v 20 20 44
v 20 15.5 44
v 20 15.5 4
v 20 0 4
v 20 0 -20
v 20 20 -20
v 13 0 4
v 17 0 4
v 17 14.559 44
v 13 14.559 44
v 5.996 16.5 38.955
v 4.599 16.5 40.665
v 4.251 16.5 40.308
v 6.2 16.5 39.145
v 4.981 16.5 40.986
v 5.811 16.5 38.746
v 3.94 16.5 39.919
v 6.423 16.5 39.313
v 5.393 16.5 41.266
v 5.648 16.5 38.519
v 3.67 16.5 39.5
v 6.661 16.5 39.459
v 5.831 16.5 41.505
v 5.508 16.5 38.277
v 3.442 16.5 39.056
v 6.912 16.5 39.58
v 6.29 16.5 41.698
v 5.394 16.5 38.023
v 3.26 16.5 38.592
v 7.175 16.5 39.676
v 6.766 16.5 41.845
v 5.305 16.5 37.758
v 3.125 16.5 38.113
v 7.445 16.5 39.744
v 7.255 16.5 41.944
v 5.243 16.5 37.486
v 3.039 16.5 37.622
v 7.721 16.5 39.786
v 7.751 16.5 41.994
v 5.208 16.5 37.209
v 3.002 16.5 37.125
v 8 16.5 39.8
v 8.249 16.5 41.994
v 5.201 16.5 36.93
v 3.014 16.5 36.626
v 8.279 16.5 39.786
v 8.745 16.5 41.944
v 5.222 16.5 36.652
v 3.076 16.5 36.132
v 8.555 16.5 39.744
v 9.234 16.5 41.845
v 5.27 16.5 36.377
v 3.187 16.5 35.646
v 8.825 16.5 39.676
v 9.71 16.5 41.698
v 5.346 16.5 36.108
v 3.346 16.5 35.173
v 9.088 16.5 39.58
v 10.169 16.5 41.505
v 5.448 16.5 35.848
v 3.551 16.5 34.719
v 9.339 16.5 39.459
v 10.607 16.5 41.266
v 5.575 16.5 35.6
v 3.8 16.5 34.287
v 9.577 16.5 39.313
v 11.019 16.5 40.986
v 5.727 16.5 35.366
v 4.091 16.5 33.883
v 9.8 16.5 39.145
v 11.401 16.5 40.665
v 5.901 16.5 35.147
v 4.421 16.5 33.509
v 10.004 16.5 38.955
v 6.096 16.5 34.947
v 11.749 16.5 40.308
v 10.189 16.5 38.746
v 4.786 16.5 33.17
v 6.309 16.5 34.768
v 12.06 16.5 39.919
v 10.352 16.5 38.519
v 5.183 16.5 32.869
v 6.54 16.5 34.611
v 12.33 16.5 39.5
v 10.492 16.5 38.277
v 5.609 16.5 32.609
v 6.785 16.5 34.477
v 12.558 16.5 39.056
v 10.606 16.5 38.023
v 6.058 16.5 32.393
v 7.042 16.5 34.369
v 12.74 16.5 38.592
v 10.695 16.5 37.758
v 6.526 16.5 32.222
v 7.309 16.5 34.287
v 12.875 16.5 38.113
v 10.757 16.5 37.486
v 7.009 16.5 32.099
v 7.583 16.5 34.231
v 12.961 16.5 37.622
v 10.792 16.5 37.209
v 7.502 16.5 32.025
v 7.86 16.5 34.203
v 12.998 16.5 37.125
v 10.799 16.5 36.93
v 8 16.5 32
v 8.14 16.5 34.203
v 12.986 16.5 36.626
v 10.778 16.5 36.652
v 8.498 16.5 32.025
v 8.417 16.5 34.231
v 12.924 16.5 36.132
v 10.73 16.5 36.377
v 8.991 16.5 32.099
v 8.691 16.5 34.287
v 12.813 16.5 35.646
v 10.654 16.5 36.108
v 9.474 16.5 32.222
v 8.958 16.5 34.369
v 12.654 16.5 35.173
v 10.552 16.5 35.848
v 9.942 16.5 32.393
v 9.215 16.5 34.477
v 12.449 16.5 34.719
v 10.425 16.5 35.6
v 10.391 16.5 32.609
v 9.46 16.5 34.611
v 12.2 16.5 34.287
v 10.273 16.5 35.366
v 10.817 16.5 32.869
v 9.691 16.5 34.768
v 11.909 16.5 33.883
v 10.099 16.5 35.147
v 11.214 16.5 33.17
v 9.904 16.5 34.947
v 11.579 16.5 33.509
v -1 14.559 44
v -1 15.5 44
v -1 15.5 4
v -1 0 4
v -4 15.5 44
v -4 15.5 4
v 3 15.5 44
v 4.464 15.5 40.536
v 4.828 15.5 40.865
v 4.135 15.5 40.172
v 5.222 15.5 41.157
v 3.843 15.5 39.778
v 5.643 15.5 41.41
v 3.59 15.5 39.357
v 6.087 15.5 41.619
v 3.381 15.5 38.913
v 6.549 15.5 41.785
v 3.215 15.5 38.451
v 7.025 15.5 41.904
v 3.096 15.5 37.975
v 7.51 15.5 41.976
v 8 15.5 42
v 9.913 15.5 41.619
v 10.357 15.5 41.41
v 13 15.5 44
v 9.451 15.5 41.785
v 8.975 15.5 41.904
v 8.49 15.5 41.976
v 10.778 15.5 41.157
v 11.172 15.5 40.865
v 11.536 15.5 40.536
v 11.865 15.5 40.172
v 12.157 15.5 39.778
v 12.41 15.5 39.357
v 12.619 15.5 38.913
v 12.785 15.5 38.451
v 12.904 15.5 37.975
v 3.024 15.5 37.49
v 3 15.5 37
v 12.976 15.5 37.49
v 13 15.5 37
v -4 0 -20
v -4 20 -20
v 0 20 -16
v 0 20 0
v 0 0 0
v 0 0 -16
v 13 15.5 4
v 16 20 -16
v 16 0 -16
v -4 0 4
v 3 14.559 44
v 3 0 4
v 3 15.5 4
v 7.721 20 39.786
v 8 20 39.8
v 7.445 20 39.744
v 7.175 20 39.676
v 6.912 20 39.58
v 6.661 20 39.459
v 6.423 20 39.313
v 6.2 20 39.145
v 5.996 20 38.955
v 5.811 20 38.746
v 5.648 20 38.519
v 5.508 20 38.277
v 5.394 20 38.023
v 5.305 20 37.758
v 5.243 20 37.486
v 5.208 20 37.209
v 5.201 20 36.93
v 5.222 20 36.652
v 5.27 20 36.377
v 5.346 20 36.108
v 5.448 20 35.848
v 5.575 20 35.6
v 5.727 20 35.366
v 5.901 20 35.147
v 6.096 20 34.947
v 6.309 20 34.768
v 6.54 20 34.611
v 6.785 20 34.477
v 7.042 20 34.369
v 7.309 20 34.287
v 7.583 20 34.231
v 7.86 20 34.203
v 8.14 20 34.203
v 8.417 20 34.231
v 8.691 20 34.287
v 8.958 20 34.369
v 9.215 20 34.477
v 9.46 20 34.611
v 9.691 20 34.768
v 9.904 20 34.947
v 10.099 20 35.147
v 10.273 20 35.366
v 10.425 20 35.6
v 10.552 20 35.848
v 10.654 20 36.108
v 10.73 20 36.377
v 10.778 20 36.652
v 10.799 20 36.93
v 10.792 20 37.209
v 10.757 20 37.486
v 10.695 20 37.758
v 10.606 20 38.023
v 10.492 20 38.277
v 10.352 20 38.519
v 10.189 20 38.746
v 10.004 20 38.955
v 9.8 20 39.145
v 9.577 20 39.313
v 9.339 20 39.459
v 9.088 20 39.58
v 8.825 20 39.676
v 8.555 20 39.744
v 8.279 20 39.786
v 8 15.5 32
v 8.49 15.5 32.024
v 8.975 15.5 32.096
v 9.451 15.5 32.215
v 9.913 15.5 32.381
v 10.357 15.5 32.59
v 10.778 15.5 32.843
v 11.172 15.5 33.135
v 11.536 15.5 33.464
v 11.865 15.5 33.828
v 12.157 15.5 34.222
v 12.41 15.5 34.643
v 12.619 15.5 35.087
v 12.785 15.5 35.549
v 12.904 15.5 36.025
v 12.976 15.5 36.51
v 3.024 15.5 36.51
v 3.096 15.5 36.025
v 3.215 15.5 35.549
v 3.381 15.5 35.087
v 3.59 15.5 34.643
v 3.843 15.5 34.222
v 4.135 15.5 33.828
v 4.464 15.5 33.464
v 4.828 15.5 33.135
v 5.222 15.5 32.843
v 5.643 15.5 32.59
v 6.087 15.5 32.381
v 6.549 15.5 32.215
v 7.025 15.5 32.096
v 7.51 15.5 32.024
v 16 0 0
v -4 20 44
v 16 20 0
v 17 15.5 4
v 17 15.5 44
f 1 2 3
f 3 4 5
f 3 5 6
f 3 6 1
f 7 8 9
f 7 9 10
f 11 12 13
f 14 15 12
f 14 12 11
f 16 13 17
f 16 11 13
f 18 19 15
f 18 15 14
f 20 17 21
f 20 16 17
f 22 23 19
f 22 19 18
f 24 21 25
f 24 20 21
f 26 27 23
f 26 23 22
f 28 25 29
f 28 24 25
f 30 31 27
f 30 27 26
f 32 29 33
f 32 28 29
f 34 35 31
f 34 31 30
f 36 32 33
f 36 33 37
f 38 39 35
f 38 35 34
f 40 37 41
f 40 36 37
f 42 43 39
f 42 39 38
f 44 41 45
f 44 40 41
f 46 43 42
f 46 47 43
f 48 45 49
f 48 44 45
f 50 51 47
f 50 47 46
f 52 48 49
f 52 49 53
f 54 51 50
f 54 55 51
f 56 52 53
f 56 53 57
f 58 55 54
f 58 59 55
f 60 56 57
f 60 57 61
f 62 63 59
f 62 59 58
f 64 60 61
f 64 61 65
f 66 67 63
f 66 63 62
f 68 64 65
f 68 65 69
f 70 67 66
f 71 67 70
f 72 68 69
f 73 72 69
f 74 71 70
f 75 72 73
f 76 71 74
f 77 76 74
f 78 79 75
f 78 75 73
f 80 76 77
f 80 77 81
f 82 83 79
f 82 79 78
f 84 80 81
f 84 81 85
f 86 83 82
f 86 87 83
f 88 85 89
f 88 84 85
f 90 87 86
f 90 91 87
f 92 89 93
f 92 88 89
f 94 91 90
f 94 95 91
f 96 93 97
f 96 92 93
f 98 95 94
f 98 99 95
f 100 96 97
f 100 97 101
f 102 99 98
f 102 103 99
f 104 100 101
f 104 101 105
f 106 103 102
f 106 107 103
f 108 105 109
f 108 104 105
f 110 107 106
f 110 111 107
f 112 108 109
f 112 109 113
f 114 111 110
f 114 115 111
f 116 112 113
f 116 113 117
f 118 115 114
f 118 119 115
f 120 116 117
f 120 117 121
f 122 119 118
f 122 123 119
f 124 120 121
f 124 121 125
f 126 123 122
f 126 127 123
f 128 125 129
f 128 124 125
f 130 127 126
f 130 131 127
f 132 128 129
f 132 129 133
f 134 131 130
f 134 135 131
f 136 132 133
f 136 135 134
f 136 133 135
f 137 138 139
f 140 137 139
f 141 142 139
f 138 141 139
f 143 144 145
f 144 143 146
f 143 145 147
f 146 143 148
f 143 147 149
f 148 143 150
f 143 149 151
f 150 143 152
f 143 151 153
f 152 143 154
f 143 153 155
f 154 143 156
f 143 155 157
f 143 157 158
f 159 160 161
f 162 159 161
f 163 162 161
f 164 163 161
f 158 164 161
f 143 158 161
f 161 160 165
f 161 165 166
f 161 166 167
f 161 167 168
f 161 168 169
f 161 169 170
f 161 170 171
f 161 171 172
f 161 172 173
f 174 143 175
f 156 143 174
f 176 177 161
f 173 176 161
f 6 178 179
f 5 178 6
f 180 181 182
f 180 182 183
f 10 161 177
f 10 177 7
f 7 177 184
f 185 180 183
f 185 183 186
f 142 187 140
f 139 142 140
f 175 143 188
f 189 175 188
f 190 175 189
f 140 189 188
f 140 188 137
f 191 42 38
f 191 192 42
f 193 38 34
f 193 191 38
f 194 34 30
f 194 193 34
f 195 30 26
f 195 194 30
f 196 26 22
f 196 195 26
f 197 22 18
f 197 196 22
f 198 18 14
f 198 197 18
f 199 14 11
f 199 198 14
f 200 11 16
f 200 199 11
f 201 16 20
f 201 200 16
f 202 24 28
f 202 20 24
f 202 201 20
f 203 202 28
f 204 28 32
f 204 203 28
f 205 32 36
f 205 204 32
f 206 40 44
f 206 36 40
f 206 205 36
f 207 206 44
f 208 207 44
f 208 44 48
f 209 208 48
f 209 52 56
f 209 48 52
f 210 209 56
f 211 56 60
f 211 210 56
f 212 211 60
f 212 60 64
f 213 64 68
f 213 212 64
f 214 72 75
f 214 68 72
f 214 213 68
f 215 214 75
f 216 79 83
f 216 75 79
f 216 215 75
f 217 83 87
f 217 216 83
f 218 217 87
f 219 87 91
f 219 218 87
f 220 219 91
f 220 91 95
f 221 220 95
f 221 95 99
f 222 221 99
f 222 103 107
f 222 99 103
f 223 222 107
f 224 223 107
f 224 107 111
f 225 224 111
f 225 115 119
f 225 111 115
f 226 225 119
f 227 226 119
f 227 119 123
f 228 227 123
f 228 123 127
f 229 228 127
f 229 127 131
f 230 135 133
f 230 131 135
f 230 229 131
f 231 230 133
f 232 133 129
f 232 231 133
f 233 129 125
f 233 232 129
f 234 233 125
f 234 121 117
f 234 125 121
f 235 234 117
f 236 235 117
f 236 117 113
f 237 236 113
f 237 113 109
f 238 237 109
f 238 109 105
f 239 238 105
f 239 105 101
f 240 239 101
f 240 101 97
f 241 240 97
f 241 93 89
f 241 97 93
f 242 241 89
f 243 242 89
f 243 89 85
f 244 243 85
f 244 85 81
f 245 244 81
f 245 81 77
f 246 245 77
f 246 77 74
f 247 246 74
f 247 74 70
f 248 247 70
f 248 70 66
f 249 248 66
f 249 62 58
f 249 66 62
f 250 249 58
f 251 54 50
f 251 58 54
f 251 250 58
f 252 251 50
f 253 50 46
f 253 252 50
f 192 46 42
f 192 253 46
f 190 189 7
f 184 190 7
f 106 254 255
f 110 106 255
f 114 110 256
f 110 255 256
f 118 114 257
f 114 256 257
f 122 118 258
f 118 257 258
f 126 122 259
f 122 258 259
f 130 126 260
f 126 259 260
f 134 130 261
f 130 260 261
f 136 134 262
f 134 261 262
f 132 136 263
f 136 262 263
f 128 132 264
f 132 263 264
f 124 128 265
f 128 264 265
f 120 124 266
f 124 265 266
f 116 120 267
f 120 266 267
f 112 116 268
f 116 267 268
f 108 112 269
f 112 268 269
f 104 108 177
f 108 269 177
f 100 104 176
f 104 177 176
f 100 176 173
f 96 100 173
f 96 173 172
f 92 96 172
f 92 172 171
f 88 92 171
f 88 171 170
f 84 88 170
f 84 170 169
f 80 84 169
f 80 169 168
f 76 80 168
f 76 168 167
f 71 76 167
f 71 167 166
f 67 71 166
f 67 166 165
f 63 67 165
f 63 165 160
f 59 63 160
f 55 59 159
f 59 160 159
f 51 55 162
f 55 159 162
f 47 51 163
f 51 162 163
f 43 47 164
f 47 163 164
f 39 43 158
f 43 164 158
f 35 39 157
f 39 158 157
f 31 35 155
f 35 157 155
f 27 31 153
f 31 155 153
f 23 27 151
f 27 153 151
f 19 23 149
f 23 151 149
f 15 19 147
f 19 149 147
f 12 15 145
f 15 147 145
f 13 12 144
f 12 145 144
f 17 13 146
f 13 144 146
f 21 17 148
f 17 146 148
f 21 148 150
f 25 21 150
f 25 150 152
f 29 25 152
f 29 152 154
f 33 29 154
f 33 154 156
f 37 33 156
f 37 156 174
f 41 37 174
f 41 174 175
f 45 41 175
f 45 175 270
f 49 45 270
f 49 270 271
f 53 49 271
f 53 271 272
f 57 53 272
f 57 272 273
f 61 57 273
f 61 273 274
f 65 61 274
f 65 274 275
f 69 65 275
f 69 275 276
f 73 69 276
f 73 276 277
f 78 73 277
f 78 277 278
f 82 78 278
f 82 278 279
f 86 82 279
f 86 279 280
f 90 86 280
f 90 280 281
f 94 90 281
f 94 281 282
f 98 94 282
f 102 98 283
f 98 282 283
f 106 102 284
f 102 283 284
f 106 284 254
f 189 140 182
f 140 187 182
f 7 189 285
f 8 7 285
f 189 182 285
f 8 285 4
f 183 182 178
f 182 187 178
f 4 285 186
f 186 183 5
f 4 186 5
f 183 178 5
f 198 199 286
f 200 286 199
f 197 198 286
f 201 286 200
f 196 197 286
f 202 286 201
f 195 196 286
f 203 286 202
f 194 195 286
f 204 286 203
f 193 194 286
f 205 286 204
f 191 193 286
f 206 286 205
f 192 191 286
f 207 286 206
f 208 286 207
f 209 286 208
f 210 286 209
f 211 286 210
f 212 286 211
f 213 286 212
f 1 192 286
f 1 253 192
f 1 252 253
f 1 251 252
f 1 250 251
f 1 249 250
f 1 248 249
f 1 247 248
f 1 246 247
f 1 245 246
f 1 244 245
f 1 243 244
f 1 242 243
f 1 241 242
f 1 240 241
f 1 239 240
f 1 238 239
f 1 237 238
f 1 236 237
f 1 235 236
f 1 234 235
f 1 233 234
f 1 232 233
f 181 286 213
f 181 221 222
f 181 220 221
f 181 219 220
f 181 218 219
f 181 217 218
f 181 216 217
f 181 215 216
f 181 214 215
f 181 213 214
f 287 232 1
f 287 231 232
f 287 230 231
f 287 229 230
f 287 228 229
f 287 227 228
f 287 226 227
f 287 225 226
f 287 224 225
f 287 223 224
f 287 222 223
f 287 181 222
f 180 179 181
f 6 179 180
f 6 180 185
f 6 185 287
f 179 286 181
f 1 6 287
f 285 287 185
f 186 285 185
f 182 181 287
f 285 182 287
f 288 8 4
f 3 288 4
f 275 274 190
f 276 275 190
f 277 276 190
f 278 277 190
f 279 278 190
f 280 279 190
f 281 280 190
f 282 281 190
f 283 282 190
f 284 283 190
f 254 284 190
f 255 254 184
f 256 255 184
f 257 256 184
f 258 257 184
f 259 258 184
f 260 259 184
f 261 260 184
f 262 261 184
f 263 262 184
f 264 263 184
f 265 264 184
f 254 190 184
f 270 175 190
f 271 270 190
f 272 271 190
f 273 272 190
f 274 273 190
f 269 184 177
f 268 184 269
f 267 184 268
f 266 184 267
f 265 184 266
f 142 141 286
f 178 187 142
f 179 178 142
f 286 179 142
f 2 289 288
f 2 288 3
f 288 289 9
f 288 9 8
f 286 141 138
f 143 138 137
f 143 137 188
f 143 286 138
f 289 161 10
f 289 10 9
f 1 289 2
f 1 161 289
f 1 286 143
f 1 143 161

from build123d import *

# Parameters (mm, degrees)
SKETCH_1_W               = 24
SKETCH_1_H               = 24
SKETCH_1_W_2             = 16
SKETCH_1_H_2             = 16
EXTRUDE_1_DEPTH          = 20
SKETCH_2_W               = 24
SKETCH_2_H               = 4.5
EXTRUDE_2_DEPTH          = 40
CUT_EXTRUDE_1_DEPTH      = 40
CUT_EXTRUDE_1_DEPTH_BACK = 40
SKETCH_3_R               = 2.8
SKETCH_6_W               = 4
SKETCH_6_H               = 40
EXTRUDE_3_DEPTH          = 15.5
CHAMFER_1_SIZE           = 40
CHAMFER_1_SIZE2          = 14.558809371
SKETCH_7_R               = 5
CUT_EXTRUDE_2_DEPTH      = 1


with BuildPart() as part:
    # 草图1 → 凸台-拉伸1 (new body)
    with BuildSketch(Plane(origin=(0, 0, 0), x_dir=(1, 0, 0), z_dir=(0, 1, 0))):
        with Locations((8, 8)):
            Rectangle(SKETCH_1_W, SKETCH_1_H)
        with Locations((8, 8)):
            Rectangle(SKETCH_1_W_2, SKETCH_1_H_2, mode=Mode.SUBTRACT)
    extrude(amount=EXTRUDE_1_DEPTH)

    # 草图2 → 凸台-拉伸2 (add)
    with BuildSketch(Plane.XY.offset(4)):
        with Locations((8, 17.75)):
            Rectangle(SKETCH_2_W, SKETCH_2_H)
    extrude(amount=EXTRUDE_2_DEPTH)

    # 草图3 → 切除-拉伸1 (cut, two sides: drawn at the far end of the back side and taken through both)
    with BuildSketch(Plane(origin=(0, 15.5, 0), x_dir=(-1, 0, 0), z_dir=(0, -1, 0)).offset(-CUT_EXTRUDE_1_DEPTH_BACK)):
        with Locations(Location((-8, -37, 0), (0, 0, 270))):
            Circle(SKETCH_3_R)
    extrude(amount=CUT_EXTRUDE_1_DEPTH + CUT_EXTRUDE_1_DEPTH_BACK, mode=Mode.SUBTRACT)

    # 草图6 → 凸台-拉伸3 (add)
    with BuildSketch(Plane(origin=(0, 15.5, 0), x_dir=(-1, 0, 0), z_dir=(0, -1, 0))):
        with Locations((-1, -24)):
            Rectangle(SKETCH_6_W, SKETCH_6_H)
        with Locations((-15, -24)):
            Rectangle(SKETCH_6_W, SKETCH_6_H)
    extrude(amount=EXTRUDE_3_DEPTH)

    # 倒角1
    chamfer_1_edges = [part.edges().sort_by_distance(p)[0] for p in [
        (1, 0, 44),
        (15, 0, 44),
    ]]
    chamfer_1_side = [part.faces().sort_by_distance(p)[0] for p in [
        (-3.3164797, 0, -8),
    ]]
    chamfer(chamfer_1_edges, length=CHAMFER_1_SIZE, length2=CHAMFER_1_SIZE2, reference=chamfer_1_side[0])

    # 草图7 → 切除-拉伸2 (cut)
    with BuildSketch(Plane(origin=(0, 15.5, 0), x_dir=(-1, 0, 0), z_dir=(0, -1, 0))):
        with Locations(Location((-8, -37, 0), (0, 0, 90))):
            Circle(SKETCH_7_R)
    extrude(amount=-CUT_EXTRUDE_2_DEPTH, mode=Mode.SUBTRACT)


solid = part.part
